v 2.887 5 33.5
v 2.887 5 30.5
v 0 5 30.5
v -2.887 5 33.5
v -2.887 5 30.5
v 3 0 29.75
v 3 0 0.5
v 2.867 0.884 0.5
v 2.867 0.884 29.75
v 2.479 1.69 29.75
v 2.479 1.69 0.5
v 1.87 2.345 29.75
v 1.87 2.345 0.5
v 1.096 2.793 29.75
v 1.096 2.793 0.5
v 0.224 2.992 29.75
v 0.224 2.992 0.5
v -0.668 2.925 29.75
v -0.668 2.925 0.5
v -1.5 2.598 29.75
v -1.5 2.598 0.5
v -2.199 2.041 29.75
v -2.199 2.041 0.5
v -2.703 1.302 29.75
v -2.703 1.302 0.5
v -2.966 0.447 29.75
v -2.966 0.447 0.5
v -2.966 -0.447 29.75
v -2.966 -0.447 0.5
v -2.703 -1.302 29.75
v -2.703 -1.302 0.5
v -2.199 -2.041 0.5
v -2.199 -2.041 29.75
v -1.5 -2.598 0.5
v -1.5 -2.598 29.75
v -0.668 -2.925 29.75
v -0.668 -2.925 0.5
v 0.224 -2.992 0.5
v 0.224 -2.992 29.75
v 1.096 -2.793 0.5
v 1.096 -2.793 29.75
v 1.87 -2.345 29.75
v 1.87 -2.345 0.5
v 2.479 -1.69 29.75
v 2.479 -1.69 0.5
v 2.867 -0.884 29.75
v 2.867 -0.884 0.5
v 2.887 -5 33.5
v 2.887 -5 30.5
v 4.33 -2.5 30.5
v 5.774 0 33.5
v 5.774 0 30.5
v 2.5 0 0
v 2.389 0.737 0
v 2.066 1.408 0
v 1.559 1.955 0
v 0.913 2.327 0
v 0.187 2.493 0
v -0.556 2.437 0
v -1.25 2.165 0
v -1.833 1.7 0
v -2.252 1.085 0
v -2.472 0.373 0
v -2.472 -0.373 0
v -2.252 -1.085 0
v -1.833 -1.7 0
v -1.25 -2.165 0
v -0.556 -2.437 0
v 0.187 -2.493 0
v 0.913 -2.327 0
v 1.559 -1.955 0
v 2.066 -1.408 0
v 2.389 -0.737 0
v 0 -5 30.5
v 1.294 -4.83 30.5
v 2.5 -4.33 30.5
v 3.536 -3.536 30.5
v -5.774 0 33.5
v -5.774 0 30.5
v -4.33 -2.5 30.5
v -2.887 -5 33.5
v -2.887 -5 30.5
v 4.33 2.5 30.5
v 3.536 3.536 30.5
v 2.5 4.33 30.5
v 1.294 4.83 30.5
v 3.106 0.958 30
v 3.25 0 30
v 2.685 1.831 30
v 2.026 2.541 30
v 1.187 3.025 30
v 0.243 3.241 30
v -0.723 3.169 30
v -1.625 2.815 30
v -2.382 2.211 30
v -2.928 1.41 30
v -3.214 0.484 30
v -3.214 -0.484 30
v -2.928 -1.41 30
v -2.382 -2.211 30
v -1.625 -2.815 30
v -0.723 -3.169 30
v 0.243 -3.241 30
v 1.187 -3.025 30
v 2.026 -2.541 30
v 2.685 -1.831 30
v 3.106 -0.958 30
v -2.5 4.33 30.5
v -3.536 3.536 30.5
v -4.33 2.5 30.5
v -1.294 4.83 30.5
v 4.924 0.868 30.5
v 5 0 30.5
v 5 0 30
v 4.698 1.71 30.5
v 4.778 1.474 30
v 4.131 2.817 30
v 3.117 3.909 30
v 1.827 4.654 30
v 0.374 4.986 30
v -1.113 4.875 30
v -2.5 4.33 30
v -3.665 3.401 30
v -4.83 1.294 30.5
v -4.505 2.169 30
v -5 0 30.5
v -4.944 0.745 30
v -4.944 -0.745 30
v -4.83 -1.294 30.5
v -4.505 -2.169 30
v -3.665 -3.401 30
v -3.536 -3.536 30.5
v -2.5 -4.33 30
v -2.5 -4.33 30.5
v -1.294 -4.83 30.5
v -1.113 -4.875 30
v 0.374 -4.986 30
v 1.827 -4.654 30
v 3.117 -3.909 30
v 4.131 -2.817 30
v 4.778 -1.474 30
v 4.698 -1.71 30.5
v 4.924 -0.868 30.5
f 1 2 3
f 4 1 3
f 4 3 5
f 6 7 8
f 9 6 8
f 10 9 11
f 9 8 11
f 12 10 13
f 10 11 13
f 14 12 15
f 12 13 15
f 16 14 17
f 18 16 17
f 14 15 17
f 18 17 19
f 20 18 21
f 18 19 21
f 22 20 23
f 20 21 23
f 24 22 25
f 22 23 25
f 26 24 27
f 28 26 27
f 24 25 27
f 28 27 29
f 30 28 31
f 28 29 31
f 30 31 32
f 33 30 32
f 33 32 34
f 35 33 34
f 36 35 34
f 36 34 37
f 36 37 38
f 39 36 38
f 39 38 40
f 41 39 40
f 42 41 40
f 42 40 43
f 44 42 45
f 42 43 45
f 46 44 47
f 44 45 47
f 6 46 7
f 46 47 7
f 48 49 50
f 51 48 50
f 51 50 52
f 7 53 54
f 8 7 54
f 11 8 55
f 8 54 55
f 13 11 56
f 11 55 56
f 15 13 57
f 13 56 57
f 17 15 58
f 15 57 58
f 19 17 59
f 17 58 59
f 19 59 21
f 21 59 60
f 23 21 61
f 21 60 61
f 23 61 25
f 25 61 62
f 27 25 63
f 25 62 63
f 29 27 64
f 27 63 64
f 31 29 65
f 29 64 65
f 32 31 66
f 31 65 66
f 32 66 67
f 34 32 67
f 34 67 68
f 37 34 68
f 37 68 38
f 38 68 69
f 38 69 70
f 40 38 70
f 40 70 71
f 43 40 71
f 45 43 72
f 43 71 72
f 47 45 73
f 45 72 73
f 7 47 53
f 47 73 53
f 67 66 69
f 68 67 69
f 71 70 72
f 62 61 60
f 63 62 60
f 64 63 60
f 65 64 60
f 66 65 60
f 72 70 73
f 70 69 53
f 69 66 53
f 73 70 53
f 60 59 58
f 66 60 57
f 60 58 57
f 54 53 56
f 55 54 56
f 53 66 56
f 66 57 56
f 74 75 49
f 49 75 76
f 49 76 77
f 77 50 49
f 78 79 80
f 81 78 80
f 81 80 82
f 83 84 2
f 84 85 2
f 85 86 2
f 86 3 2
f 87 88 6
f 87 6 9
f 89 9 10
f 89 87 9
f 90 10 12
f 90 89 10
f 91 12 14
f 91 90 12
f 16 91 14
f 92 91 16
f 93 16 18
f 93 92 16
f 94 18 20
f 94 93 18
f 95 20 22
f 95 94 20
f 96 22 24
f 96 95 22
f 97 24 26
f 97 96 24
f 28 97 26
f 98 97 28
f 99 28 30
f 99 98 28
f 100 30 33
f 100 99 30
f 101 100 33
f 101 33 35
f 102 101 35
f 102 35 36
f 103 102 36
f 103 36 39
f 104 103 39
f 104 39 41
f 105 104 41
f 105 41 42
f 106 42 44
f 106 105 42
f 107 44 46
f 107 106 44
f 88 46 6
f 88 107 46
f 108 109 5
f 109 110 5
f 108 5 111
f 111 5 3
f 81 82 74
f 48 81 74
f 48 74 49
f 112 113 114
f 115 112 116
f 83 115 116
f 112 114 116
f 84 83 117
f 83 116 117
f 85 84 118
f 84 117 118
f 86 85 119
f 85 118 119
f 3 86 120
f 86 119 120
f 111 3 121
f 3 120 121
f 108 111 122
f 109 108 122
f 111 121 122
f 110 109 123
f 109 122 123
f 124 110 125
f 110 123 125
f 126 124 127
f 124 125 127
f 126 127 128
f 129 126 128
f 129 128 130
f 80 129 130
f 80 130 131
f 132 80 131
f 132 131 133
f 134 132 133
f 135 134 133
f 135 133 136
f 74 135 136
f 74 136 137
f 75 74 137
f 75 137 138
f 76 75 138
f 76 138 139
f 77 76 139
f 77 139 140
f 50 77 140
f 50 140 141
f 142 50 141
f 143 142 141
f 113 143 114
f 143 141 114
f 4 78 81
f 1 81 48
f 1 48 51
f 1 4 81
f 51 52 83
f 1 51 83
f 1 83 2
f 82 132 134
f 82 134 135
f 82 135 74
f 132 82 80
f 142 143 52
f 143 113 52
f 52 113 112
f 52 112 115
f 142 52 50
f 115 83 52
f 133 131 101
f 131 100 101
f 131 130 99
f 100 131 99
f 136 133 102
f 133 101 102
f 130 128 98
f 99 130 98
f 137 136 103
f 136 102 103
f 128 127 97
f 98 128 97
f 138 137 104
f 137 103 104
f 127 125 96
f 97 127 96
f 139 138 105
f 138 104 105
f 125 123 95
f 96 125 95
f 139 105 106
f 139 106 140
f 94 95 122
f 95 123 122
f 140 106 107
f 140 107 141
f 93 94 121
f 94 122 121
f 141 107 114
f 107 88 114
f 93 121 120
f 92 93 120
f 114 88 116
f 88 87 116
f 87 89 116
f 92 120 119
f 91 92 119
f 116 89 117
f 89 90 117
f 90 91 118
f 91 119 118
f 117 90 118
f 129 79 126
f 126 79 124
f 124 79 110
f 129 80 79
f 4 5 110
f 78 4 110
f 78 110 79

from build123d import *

# Parameters (mm, degrees)
SKETCH1_R           = 3
BOSS_EXTRUDE1_DEPTH = 30
SKETCH2_R           = 5
BOSS_EXTRUDE2_DEPTH = 0.5
BOSS_EXTRUDE3_DEPTH = 3
CHAMFER1_SIZE       = 0.5
CHAMFER2_SIZE       = 0.25


with BuildPart() as part:
    # Sketch1 → Boss-Extrude1 (new body)
    with BuildSketch(Plane.XY):
        Circle(SKETCH1_R)
    extrude(amount=BOSS_EXTRUDE1_DEPTH)

    # Sketch2 → Boss-Extrude2 (add)
    with BuildSketch(Plane.XY.offset(30)):
        Circle(SKETCH2_R)
    extrude(amount=BOSS_EXTRUDE2_DEPTH)

    # Sketch3 → Boss-Extrude3 (add)
    with BuildSketch(Plane.XY.offset(30.5)):
        Polygon((5.773502692, 0), (2.886751346, 5), (-2.886751346, 5), (-5.773502692, 0), (-2.886751346, -5), (2.886751346, -5), align=None)
    extrude(amount=BOSS_EXTRUDE3_DEPTH)

    # Chamfer1
    chamfer1_edges = [part.edges().sort_by_distance(p)[0] for p in [
        (-3, 0, 0),
    ]]
    chamfer(chamfer1_edges, length=CHAMFER1_SIZE)

    # Chamfer2
    chamfer2_edges = [part.edges().sort_by_distance(p)[0] for p in [
        (-3, 0, 30),
    ]]
    chamfer(chamfer2_edges, length=CHAMFER2_SIZE)


solid = part.part
